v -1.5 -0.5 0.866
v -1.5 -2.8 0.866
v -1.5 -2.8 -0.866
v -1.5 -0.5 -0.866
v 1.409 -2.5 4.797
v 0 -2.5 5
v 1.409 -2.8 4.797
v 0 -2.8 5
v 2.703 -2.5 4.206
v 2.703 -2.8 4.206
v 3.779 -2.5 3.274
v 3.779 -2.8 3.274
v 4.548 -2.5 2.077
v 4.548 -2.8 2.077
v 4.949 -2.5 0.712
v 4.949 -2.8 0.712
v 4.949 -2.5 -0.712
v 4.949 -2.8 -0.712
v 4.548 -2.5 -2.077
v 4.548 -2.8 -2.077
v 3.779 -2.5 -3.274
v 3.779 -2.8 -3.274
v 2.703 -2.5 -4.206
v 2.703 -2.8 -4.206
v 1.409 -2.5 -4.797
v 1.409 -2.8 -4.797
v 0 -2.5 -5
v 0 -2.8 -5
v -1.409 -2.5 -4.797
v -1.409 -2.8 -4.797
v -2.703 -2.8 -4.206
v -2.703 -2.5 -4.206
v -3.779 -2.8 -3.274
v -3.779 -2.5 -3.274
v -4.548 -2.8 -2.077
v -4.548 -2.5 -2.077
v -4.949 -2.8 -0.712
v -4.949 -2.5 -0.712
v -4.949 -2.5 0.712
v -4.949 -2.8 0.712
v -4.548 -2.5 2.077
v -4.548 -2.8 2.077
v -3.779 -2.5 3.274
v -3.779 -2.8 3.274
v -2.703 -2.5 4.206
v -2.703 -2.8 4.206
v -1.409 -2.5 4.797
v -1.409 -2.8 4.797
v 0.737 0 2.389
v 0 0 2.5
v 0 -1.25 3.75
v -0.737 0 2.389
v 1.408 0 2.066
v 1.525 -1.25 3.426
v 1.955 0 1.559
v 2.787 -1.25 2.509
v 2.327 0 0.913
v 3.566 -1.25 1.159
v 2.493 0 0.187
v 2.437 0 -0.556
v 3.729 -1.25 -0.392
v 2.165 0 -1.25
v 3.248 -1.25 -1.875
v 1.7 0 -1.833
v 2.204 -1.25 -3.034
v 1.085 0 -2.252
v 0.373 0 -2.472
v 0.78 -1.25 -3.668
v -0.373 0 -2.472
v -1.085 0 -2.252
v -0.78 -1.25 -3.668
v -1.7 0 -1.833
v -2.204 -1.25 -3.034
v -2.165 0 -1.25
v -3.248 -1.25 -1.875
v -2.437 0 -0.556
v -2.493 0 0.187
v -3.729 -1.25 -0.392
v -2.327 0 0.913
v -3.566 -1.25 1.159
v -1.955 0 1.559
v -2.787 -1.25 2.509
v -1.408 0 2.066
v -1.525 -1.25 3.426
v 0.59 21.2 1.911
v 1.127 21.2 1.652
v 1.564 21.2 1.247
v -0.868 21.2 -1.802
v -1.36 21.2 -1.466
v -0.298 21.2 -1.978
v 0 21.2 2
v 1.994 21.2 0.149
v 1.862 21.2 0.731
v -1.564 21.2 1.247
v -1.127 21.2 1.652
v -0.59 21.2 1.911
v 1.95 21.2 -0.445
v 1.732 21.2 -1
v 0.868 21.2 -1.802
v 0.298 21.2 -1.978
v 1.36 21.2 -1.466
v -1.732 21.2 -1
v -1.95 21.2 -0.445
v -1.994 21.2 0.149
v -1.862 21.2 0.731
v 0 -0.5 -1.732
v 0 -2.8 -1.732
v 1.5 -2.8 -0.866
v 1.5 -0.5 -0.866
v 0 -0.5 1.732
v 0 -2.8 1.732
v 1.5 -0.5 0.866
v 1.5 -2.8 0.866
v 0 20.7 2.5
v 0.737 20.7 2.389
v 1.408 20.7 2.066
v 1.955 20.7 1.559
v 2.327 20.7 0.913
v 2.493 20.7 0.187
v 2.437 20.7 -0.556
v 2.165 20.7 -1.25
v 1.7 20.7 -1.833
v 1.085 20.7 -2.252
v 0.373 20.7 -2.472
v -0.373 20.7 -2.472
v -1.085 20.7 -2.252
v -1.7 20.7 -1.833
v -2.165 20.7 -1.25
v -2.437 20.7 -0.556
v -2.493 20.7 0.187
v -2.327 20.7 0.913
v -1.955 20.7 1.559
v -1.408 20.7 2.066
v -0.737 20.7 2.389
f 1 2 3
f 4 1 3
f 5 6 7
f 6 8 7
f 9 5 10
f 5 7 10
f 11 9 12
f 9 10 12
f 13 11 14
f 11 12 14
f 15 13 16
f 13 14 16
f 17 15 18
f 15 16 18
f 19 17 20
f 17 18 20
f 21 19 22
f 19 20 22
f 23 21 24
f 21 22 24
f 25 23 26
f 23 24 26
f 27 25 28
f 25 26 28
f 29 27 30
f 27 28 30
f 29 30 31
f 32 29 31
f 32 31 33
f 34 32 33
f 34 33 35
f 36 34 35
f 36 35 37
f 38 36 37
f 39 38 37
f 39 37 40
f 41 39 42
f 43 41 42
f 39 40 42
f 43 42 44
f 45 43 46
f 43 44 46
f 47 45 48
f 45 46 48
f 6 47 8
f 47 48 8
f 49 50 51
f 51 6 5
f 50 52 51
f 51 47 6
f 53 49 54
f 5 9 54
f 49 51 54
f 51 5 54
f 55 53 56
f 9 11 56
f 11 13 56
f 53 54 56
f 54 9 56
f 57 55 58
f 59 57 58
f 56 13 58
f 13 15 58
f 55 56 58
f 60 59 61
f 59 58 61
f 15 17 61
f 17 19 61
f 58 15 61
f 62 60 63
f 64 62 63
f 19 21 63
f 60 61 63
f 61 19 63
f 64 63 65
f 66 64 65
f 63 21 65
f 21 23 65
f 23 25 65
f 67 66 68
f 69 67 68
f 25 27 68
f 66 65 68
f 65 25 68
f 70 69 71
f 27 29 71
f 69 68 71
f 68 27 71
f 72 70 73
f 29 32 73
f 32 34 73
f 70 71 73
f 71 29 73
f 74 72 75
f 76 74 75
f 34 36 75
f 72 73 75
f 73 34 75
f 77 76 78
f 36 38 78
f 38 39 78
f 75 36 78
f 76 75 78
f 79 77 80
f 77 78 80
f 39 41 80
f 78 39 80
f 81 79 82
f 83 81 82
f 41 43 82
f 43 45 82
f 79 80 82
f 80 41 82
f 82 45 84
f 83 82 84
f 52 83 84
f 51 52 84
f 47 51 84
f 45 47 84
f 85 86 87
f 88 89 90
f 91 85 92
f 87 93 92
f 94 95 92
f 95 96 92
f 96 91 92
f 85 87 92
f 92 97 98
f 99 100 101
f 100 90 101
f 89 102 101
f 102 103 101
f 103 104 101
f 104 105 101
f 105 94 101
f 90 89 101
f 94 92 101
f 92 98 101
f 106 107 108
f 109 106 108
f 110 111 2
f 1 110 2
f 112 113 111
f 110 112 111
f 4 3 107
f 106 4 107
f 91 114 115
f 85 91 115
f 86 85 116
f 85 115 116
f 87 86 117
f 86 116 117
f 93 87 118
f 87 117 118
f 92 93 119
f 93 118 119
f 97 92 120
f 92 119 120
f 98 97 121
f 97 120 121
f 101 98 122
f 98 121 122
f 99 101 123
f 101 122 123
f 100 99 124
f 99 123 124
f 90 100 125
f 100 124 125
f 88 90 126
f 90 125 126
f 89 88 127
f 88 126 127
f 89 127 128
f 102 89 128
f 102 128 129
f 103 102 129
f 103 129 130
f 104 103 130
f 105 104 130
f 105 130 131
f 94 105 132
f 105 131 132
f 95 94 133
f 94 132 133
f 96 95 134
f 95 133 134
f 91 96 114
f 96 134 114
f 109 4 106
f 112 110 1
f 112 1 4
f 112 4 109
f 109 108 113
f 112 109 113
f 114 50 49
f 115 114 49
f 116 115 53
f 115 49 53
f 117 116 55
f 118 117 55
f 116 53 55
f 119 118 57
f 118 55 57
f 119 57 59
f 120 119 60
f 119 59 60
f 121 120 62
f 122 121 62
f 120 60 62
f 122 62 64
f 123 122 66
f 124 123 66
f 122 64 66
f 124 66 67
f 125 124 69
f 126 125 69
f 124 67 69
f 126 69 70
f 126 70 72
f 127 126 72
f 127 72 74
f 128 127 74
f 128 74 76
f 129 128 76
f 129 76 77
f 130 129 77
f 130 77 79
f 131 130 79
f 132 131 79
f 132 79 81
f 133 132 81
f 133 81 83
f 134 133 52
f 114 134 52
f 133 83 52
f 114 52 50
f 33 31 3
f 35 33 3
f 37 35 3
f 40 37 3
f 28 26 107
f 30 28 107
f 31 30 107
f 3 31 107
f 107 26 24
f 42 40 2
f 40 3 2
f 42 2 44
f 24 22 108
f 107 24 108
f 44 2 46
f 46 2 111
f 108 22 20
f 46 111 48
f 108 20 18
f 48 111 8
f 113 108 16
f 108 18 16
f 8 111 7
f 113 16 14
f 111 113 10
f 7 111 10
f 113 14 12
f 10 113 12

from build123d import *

# Parameters (mm, degrees)
F2_SIZE  = 0.5
F4_DEPTH = 2.3


with BuildPart() as f1:
    # F0 (on Right) → F1 (revolve)
    with BuildSketch(Plane.YZ):
        Polygon((-2.8, 5), (-2.8, 0), (21.2, 0), (21.2, 2.5), (0, 2.5), (-2.5, 5), align=None)
    revolve(axis=Axis((0, 9.2, 0), (0, 1, 0)))

    # F2
    f2_edges = [f1.edges().sort_by_distance(p)[0] for p in [
        (0, 21.2, -2.5),
    ]]
    chamfer(f2_edges, length=F2_SIZE)

    # F3 (on face) → F4 (cut)
    with BuildSketch(Plane.XZ.offset(2.8)):
        Polygon((0, -1.732051), (1.5, -0.866025), (1.5, 0.866025), (0, 1.732051), (-1.5, 0.866025), (-1.5, -0.866025), align=None)
    extrude(amount=-F4_DEPTH, mode=Mode.SUBTRACT)


solid = f1.part
